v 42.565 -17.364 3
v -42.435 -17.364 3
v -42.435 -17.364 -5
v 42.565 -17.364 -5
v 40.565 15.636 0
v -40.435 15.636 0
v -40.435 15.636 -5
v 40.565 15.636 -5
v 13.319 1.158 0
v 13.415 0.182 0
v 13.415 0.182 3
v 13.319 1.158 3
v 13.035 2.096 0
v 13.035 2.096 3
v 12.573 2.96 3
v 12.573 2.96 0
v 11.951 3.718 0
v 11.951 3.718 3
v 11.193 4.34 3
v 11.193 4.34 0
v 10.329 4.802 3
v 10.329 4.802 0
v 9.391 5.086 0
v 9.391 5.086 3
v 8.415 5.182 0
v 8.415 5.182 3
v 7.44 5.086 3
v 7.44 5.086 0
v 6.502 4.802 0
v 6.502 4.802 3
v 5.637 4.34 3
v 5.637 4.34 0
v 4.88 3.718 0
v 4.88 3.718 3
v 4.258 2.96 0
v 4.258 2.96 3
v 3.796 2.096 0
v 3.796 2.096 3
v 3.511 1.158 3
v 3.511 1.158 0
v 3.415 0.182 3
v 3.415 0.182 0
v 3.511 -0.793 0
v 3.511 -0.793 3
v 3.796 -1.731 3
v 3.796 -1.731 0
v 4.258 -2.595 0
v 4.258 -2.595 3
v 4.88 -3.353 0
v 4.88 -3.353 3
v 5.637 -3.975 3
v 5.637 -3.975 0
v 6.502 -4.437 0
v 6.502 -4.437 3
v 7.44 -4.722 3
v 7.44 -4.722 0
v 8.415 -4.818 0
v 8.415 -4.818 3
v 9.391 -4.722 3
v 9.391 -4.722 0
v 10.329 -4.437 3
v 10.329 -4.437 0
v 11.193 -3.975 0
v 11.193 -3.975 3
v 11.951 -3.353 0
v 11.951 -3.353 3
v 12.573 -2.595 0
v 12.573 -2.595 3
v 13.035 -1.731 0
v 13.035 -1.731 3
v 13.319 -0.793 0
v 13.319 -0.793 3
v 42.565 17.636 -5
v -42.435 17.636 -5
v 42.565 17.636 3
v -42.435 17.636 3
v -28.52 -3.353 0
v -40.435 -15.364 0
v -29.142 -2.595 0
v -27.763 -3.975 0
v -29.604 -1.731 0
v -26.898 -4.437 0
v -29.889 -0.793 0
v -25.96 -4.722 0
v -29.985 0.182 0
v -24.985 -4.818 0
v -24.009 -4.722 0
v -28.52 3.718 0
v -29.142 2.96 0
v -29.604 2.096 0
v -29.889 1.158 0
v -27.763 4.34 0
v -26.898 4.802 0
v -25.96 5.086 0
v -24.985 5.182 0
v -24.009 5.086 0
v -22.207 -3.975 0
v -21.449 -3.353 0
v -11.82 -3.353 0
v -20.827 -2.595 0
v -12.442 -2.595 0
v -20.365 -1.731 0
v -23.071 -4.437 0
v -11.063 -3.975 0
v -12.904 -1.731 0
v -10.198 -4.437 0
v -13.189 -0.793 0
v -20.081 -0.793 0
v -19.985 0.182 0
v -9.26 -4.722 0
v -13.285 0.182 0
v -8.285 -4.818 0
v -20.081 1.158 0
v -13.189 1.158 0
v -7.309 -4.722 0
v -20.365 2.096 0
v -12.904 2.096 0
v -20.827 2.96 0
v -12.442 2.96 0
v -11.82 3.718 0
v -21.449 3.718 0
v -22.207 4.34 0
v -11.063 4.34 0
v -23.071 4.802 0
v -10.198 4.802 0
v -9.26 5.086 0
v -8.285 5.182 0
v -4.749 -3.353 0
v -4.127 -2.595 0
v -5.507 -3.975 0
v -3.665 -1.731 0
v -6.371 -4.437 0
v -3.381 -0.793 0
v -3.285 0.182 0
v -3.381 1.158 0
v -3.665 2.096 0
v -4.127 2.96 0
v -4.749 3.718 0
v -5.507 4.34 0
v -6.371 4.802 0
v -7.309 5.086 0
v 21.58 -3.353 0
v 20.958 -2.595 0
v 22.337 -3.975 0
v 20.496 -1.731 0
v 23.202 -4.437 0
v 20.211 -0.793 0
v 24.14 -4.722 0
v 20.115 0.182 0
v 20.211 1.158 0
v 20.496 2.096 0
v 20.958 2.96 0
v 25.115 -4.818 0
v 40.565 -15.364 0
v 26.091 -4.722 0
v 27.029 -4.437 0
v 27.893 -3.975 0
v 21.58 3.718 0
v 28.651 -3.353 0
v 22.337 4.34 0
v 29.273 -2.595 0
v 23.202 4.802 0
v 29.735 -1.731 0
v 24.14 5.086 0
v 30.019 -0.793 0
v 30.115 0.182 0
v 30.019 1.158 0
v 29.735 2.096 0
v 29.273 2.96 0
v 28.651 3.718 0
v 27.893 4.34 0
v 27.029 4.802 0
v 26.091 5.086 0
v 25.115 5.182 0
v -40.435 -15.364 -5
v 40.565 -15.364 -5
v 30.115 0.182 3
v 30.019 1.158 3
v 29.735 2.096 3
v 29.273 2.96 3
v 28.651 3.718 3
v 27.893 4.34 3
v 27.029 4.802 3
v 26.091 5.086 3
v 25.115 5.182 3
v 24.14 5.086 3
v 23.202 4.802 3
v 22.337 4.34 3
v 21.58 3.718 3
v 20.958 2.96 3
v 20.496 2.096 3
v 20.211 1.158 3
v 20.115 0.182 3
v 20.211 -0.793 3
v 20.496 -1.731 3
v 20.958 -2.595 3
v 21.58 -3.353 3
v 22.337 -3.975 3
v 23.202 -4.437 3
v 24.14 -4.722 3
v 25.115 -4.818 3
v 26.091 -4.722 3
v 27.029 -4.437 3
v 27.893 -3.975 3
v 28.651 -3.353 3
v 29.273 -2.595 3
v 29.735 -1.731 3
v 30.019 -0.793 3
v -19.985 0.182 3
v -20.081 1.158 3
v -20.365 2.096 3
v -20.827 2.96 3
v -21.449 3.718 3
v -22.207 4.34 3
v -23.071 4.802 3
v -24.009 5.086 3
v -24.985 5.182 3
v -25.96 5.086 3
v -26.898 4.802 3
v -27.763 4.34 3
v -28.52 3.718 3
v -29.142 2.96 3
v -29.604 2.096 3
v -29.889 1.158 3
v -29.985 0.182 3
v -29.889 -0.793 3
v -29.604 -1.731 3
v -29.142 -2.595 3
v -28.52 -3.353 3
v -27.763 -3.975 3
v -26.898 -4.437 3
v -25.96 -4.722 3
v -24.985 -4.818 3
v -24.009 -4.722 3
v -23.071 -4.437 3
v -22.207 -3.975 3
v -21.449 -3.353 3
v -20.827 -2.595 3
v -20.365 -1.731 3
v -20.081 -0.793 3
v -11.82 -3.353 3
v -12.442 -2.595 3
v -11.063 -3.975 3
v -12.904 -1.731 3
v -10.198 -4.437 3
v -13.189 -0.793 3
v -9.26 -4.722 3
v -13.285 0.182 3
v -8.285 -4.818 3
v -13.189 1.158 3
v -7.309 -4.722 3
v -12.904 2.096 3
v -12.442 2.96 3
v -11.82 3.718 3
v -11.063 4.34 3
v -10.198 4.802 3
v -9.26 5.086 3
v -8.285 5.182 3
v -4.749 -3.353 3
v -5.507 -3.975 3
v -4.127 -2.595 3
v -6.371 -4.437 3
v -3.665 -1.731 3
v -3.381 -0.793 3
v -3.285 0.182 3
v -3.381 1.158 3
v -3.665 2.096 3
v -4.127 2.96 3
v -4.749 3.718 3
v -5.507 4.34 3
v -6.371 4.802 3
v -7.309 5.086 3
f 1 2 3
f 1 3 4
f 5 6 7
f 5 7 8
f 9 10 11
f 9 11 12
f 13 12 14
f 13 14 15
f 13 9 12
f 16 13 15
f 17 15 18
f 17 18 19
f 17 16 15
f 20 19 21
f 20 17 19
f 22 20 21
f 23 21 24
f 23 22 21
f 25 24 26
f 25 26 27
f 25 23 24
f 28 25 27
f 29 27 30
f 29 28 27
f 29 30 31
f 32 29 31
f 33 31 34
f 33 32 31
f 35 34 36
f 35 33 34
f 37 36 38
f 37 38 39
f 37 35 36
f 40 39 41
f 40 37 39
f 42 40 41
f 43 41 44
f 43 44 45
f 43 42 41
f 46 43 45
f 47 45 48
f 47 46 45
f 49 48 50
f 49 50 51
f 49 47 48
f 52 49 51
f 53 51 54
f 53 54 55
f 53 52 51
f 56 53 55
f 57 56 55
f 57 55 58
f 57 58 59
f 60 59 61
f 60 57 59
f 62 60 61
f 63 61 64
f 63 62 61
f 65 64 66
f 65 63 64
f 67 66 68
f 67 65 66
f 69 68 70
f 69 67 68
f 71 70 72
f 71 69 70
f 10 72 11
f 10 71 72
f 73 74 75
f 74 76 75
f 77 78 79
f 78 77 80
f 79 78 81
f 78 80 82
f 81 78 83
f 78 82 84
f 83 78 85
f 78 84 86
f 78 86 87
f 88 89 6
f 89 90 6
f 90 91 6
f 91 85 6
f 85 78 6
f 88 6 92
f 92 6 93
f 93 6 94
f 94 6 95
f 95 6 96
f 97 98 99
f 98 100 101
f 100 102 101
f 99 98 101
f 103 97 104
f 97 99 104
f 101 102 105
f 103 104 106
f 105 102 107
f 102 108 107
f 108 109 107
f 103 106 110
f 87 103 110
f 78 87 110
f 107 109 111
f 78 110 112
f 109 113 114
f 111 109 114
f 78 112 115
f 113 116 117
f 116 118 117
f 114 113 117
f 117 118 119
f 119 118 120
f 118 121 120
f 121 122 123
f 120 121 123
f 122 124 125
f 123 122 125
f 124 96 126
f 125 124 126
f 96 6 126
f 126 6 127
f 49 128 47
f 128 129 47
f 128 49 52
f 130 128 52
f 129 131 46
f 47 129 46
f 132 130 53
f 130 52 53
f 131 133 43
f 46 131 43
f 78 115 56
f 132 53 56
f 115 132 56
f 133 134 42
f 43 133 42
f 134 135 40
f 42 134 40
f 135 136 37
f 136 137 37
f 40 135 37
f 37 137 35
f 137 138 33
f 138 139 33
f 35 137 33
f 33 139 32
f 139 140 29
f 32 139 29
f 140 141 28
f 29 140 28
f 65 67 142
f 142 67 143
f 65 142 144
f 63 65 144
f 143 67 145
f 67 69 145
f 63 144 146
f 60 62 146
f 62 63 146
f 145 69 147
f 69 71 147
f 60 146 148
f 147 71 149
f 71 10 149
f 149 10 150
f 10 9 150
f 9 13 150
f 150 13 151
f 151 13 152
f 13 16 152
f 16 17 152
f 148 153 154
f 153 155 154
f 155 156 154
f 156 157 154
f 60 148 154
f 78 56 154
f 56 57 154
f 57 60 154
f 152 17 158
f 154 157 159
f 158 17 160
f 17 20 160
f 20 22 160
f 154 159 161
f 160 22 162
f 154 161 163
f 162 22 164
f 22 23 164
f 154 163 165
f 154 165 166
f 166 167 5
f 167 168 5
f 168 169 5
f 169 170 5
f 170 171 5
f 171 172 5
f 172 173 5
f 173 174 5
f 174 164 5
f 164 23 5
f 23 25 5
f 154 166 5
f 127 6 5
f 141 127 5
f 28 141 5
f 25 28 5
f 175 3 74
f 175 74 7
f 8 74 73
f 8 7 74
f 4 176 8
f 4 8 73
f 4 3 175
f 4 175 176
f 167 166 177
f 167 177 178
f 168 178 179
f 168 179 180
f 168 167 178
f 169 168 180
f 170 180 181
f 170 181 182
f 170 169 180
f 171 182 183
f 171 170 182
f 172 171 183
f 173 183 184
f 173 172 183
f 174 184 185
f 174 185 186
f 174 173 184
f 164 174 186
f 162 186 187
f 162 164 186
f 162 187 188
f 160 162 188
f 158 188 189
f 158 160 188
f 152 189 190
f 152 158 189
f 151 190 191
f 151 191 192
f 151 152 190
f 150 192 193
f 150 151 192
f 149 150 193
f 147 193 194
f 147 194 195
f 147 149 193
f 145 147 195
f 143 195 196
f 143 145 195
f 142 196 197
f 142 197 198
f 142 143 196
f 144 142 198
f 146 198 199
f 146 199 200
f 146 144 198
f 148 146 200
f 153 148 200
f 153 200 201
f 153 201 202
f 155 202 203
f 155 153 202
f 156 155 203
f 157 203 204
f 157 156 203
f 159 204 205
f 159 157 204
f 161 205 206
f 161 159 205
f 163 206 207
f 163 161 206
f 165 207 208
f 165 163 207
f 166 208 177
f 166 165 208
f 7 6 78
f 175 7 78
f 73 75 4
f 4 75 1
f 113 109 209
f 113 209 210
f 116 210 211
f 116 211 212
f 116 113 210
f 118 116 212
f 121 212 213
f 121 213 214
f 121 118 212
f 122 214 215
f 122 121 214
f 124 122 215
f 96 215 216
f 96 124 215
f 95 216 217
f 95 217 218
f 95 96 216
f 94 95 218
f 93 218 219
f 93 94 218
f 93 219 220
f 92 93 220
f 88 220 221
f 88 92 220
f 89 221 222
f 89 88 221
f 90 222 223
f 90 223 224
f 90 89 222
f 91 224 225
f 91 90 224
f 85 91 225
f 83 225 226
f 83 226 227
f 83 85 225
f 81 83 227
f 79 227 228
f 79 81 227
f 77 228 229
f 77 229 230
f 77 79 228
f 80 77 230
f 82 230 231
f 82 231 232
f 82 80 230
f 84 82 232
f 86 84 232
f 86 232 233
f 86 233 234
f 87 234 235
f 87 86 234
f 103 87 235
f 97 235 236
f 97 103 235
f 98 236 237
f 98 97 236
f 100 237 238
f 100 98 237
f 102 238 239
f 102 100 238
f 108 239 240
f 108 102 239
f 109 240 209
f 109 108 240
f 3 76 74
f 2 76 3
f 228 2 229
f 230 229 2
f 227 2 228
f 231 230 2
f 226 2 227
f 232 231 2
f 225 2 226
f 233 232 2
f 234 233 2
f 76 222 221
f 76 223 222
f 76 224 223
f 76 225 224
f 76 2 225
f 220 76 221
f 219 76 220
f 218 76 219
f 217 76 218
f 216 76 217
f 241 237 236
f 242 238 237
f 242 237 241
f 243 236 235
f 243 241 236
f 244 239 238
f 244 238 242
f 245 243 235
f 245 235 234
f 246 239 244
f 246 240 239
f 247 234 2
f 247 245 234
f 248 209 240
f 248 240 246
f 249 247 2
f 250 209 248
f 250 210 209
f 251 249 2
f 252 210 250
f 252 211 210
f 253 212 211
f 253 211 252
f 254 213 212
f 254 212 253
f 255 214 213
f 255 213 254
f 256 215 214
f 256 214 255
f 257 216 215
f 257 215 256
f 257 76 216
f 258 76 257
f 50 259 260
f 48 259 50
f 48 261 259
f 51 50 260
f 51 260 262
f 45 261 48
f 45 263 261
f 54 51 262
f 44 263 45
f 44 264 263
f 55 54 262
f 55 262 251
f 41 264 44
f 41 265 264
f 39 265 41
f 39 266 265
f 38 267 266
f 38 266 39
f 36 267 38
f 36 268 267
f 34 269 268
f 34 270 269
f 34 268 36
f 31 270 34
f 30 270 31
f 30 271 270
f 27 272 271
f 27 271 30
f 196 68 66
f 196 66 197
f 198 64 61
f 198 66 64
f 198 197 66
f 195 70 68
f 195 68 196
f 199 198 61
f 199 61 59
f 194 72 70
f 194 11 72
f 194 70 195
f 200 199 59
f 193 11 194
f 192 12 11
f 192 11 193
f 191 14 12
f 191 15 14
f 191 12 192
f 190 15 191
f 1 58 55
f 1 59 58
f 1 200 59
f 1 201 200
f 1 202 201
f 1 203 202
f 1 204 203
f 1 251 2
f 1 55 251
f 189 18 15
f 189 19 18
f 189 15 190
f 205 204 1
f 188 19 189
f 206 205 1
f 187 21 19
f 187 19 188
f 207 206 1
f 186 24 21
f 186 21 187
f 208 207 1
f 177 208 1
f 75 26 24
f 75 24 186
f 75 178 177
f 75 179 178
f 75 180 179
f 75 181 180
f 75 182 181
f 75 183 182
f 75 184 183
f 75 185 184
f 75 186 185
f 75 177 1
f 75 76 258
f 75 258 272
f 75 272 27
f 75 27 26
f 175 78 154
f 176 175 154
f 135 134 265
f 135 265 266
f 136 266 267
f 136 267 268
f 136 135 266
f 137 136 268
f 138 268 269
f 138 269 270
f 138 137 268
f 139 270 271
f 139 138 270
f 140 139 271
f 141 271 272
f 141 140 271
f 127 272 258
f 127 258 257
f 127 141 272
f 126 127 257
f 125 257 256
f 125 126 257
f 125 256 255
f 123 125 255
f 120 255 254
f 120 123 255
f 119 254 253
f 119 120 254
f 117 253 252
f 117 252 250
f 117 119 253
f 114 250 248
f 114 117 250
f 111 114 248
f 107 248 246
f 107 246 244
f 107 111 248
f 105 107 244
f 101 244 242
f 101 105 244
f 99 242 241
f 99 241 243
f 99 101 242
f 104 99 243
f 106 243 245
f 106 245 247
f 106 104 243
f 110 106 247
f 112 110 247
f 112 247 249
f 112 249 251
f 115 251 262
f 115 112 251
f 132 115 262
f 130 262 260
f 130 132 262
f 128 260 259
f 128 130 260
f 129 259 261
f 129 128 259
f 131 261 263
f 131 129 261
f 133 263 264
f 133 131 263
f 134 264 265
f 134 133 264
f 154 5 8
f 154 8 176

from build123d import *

# Parameters (mm, degrees)
F0_W     = 75
F0_H     = 25
F0_R     = 5
F1_DEPTH = 3
F0_W_2   = 85
F0_H_2   = 35
F2_DEPTH = 3
F3_W     = 85
F3_H     = 35
F3_W_2   = 81
F3_H_2   = 31
F4_DEPTH = 5


with BuildPart() as f1:
    # F0 (on Top) → F1 (new body)
    with BuildSketch(Plane.XY):
        with Locations((0.065177, 0.136048)):
            Rectangle(F0_W, F0_H)
        with Locations((-24.984823, 0.182369)):
            Circle(F0_R, mode=Mode.SUBTRACT)
        with Locations((-8.284823, 0.182369)):
            Circle(F0_R, mode=Mode.SUBTRACT)
        with Locations((8.415177, 0.182369)):
            Circle(F0_R, mode=Mode.SUBTRACT)
        with Locations((25.115177, 0.182369)):
            Circle(F0_R, mode=Mode.SUBTRACT)
    extrude(amount=F1_DEPTH)

    # F0 (on Top) → F2 (join)
    with BuildSketch(Plane.XY):
        with Locations((0.065177, 0.136048)):
            Rectangle(F0_W_2, F0_H_2)
        with Locations((0.065177, 0.136048)):
            Rectangle(F0_W, F0_H, mode=Mode.SUBTRACT)
    extrude(amount=F2_DEPTH)

    # F3 (on face) → F4 (join)
    with BuildSketch(Plane(origin=(0, 0, 0), x_dir=(1, 0, 0), z_dir=(0, 0, -1))):
        with Locations((0.065177, -0.136048)):
            Rectangle(F3_W, F3_H)
        with Locations((0.065177, -0.136048)):
            Rectangle(F3_W_2, F3_H_2, mode=Mode.SUBTRACT)
    extrude(amount=F4_DEPTH)


solid = f1.part
